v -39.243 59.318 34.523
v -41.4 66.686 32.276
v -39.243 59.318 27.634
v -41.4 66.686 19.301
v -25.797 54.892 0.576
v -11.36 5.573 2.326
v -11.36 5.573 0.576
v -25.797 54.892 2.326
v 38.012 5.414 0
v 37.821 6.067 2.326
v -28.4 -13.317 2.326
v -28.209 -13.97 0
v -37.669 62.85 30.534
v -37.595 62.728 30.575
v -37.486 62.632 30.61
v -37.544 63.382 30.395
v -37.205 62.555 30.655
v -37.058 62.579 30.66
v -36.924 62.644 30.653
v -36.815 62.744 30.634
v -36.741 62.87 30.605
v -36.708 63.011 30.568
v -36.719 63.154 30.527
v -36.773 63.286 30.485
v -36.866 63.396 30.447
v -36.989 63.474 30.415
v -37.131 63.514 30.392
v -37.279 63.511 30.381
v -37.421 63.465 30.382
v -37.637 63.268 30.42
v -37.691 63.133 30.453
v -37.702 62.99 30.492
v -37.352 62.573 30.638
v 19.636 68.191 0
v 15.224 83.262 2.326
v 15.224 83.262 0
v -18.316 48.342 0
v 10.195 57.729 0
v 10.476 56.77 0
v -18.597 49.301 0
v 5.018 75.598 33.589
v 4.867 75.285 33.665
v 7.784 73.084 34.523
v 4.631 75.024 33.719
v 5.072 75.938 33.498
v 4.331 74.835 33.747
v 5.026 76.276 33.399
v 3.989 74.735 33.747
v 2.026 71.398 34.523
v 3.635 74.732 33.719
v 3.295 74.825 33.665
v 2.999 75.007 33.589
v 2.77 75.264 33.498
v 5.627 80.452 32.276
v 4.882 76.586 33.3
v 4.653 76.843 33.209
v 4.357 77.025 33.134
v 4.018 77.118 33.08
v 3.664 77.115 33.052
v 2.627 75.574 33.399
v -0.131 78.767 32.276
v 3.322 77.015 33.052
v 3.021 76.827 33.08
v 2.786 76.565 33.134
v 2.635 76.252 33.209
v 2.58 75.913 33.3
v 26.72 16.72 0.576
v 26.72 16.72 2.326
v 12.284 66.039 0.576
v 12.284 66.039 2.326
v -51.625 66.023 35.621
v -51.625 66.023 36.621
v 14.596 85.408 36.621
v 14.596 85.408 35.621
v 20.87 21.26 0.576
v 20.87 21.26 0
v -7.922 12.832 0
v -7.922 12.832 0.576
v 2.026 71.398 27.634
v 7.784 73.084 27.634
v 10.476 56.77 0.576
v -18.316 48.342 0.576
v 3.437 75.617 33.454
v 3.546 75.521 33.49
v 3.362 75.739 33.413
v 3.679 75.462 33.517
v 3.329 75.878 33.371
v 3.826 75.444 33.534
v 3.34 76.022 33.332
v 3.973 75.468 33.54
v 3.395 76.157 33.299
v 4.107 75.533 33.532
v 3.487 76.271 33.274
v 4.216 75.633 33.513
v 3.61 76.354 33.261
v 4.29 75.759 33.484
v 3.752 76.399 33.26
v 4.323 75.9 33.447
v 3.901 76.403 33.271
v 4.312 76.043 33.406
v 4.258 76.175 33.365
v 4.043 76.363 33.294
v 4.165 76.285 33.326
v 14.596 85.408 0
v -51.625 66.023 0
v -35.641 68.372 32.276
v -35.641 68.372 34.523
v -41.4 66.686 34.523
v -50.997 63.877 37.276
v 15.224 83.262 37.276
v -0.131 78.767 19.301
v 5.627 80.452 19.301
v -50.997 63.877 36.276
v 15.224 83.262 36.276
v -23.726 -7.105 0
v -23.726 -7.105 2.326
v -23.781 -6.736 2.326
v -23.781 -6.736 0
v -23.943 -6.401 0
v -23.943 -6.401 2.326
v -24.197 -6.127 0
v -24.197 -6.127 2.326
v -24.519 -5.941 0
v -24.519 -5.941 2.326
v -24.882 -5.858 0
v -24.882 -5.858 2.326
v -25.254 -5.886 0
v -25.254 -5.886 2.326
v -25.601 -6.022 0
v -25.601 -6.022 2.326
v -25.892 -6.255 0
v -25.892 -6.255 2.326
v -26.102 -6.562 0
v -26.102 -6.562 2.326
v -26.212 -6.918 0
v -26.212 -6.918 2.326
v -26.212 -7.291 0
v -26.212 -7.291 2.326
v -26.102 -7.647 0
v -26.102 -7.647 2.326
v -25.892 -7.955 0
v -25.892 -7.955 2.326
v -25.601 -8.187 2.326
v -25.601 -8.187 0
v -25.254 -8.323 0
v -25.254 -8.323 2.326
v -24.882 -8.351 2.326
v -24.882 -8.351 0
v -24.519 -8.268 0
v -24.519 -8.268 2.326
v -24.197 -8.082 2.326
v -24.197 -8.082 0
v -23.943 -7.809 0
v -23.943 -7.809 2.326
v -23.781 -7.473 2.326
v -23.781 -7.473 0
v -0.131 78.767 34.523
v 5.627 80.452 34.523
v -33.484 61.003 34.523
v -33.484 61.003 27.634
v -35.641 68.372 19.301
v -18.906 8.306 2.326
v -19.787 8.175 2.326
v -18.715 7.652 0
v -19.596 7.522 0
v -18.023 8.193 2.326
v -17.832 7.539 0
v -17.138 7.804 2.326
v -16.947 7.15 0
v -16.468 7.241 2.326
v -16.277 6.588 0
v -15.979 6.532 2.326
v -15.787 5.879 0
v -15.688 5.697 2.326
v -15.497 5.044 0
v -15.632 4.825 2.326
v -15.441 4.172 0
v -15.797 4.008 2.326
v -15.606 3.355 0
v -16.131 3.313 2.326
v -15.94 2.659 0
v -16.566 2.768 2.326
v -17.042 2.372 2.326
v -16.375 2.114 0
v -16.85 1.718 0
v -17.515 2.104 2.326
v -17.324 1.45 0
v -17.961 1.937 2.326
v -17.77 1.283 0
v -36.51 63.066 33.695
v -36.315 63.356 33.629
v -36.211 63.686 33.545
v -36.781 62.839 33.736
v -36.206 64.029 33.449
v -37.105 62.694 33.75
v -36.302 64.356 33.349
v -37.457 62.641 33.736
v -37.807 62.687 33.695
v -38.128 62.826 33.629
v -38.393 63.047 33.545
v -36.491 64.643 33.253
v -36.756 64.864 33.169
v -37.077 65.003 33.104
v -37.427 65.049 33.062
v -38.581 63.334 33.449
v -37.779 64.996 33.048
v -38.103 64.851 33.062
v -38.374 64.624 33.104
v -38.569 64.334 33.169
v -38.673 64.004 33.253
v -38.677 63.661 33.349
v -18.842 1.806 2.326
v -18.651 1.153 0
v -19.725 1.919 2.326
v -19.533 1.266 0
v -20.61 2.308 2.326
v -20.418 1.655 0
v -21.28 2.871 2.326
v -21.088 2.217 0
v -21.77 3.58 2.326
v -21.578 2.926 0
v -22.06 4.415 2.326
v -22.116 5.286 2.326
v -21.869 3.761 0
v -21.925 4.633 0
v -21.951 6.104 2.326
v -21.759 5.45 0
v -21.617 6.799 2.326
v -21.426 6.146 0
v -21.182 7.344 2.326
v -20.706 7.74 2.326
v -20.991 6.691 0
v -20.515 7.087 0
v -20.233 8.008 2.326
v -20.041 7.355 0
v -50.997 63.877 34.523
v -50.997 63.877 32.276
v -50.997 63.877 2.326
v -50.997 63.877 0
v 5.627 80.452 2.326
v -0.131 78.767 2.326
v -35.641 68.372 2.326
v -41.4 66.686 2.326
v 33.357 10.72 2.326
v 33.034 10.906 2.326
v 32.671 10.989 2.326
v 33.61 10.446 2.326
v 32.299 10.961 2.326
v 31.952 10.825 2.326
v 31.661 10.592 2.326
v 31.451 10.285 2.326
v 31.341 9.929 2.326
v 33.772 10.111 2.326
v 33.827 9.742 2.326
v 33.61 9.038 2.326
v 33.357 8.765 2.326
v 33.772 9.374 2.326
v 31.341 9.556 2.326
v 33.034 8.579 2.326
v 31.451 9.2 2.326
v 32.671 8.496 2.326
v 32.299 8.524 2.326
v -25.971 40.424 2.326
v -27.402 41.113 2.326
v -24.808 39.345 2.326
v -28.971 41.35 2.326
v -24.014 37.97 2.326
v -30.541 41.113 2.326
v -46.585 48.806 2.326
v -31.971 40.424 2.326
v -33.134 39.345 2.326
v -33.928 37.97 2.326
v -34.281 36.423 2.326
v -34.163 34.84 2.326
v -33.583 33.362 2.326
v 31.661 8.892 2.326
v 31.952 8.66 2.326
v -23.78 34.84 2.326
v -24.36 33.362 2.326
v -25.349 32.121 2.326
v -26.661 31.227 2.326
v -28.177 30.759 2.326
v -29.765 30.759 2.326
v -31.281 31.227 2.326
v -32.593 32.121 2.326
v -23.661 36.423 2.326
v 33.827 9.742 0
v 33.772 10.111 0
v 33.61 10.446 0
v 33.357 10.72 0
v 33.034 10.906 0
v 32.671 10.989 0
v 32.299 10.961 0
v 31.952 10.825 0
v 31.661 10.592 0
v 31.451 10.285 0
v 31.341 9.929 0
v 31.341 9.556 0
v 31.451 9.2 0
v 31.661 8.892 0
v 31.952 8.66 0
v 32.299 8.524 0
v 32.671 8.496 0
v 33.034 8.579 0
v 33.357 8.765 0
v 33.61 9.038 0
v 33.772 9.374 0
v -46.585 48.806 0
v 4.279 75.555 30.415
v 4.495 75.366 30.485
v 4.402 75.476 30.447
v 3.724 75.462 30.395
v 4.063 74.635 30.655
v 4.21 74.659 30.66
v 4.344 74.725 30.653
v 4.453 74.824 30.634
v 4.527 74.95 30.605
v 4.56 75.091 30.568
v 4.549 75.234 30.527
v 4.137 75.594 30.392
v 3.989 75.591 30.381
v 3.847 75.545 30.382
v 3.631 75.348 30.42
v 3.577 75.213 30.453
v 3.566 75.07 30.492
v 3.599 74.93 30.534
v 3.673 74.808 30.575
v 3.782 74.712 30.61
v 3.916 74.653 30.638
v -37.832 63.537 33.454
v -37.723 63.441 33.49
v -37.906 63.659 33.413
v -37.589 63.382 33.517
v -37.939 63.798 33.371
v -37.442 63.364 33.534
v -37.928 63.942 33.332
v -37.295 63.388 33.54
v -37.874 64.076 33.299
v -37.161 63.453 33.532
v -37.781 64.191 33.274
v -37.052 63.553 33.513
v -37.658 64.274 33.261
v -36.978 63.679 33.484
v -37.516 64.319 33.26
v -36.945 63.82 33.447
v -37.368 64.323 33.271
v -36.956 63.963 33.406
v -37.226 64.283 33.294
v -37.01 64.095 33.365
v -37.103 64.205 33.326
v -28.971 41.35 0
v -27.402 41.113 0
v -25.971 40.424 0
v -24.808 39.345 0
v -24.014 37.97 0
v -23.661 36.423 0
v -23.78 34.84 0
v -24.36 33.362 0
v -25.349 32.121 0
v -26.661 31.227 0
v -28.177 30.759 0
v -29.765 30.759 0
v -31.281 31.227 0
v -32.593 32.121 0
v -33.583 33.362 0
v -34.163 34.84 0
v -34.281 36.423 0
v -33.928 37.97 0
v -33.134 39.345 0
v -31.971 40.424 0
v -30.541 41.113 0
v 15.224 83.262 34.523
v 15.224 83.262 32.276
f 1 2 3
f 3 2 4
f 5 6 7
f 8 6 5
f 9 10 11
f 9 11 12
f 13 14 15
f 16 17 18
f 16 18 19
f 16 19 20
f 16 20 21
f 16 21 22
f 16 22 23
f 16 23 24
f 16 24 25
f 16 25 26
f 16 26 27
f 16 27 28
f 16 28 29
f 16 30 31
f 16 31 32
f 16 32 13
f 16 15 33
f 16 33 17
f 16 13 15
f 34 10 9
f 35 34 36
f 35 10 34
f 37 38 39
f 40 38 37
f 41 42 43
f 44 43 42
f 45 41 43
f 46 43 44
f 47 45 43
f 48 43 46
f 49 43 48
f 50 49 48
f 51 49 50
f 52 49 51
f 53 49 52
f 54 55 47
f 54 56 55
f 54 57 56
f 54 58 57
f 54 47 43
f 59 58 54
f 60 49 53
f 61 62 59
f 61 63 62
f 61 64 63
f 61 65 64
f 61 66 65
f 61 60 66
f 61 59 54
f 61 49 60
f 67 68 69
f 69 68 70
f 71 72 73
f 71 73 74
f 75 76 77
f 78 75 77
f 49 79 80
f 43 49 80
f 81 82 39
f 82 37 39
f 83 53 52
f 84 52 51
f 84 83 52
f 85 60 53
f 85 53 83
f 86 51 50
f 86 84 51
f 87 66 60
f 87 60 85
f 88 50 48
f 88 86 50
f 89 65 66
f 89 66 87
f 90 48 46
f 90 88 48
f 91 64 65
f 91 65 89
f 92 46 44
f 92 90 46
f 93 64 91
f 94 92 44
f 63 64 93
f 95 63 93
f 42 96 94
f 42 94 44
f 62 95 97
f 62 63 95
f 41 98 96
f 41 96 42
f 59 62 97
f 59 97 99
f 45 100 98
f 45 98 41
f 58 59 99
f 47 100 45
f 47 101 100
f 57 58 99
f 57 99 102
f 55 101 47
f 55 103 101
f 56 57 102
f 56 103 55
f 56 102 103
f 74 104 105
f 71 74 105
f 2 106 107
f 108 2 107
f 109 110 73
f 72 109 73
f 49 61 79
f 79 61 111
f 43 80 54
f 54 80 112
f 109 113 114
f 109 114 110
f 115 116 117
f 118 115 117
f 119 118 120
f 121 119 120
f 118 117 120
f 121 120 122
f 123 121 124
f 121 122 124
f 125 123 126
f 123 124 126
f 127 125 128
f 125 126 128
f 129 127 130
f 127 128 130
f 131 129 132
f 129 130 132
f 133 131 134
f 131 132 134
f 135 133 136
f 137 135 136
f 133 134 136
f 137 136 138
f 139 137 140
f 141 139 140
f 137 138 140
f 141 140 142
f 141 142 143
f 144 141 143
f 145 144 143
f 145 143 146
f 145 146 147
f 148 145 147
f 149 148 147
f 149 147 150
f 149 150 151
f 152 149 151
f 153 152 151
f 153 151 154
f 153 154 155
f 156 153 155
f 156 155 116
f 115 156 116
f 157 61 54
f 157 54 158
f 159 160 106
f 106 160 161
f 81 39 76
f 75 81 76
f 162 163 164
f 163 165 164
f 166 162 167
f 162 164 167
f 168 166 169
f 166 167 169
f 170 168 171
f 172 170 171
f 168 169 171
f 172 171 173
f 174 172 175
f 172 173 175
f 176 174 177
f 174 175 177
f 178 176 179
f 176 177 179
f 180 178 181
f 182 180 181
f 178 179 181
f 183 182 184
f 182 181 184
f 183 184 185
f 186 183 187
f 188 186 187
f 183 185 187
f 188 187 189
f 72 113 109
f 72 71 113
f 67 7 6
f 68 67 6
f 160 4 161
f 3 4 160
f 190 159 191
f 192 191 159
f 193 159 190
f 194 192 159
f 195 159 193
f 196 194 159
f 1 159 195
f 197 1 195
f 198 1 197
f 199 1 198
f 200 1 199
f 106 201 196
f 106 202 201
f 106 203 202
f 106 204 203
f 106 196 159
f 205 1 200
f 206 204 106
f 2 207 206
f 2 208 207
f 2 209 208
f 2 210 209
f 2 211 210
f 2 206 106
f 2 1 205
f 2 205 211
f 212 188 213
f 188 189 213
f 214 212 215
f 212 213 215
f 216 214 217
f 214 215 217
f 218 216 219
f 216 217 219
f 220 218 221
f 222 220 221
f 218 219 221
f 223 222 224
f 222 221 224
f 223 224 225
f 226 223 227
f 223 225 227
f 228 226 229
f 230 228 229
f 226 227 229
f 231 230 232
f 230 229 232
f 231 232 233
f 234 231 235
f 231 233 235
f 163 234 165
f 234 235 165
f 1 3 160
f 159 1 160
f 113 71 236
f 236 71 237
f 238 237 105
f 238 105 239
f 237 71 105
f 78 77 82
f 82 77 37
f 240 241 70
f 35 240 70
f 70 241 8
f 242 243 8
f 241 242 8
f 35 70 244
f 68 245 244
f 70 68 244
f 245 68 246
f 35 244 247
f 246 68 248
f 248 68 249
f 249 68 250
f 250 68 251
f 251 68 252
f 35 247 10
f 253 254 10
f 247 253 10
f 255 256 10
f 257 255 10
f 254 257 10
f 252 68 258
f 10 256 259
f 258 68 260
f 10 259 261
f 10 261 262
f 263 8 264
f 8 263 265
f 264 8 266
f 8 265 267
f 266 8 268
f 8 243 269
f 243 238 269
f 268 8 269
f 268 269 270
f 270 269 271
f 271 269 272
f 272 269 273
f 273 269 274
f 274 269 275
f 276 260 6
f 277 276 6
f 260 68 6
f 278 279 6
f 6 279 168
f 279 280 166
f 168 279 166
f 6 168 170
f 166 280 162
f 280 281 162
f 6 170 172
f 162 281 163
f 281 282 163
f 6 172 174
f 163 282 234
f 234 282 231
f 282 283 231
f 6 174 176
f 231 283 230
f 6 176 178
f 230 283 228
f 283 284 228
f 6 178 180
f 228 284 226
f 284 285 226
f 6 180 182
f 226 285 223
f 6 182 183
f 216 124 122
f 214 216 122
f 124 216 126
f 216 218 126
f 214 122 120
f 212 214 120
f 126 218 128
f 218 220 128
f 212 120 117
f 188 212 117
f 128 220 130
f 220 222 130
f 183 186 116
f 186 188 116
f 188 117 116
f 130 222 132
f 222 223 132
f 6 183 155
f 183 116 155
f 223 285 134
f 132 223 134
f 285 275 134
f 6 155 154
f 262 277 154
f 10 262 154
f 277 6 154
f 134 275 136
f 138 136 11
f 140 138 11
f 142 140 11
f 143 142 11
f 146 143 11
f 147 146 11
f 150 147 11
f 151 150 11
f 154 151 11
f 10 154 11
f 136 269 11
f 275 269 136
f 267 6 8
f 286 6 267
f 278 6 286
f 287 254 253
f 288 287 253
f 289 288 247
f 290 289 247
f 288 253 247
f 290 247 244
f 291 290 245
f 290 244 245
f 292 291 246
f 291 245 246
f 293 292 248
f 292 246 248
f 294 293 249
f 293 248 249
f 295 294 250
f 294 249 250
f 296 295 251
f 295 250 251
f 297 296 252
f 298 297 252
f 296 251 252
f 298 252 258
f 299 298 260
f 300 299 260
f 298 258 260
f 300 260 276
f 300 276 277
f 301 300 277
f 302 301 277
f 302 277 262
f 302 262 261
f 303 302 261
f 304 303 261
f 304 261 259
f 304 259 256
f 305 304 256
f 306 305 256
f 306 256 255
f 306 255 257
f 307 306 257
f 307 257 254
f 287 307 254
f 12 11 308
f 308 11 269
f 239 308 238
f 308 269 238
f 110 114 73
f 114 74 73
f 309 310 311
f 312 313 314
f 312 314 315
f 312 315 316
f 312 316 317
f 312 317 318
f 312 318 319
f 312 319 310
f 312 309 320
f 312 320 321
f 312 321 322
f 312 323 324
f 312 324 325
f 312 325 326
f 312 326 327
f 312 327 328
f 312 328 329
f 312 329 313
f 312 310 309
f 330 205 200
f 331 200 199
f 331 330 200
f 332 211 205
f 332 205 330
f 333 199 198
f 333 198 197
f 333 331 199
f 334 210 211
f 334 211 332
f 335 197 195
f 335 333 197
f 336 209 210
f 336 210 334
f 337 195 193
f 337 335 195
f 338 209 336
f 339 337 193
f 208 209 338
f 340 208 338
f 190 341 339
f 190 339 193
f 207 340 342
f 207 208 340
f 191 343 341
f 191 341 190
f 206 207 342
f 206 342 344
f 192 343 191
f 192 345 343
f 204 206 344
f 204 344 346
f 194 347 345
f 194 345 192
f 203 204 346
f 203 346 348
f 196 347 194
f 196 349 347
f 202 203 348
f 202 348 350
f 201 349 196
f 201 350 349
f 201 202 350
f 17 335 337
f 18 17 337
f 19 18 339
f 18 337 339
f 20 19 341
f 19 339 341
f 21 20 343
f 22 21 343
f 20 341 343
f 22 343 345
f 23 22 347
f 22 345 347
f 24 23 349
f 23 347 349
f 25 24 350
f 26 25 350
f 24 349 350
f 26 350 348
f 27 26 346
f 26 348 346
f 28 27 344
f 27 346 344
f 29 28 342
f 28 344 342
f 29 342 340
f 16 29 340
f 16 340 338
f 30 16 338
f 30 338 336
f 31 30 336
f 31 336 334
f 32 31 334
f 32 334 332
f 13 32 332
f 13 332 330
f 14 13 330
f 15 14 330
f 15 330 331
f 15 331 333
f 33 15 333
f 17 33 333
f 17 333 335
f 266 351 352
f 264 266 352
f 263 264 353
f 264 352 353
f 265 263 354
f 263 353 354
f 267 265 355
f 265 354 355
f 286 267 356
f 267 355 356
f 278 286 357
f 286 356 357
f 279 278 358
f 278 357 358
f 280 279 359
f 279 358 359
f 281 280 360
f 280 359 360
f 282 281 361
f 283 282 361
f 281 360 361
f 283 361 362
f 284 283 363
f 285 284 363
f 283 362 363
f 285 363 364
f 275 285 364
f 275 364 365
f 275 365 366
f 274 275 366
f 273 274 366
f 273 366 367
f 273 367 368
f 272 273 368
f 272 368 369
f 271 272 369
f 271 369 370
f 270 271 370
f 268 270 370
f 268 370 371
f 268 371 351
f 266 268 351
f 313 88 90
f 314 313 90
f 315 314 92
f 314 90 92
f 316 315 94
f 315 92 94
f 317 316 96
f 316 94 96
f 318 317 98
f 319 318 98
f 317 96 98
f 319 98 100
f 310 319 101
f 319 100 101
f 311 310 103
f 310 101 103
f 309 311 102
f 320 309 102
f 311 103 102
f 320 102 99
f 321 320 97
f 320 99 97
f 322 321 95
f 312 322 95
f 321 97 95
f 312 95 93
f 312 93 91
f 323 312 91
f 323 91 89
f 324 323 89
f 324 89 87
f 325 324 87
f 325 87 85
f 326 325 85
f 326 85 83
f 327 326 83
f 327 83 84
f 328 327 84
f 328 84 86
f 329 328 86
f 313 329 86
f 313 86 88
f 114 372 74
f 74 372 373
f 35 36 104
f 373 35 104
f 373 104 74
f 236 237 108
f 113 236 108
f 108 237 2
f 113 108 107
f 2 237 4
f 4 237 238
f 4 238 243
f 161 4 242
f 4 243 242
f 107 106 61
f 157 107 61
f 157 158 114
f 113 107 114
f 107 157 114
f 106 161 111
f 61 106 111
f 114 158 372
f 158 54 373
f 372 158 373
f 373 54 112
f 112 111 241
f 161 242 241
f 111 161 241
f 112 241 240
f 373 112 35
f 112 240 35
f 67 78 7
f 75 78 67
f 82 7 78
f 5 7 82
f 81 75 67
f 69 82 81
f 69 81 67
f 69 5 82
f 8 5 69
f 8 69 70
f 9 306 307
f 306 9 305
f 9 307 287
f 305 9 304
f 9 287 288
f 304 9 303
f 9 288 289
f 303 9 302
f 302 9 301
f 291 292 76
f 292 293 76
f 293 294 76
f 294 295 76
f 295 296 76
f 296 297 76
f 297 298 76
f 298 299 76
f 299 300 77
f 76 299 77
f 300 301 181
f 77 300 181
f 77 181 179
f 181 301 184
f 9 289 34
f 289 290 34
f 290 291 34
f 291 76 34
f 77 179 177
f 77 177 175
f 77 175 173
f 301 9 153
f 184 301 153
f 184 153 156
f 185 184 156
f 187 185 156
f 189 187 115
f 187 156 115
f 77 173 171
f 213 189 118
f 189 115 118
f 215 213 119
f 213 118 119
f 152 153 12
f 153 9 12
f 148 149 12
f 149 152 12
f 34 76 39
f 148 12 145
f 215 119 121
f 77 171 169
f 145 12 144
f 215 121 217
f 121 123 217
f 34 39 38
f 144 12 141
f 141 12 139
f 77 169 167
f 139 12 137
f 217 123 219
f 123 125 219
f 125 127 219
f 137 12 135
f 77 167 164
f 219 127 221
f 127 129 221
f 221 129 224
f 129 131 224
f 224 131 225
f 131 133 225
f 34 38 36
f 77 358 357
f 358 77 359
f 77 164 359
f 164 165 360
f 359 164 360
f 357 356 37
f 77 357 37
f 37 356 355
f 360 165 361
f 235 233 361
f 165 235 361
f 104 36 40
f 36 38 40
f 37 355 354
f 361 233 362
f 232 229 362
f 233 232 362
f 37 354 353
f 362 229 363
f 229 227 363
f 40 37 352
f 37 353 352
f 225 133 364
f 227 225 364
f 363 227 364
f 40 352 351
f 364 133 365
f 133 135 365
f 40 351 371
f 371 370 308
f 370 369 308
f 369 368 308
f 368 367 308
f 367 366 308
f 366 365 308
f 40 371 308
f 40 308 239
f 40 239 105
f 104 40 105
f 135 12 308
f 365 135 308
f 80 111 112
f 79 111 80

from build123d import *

# Parameters (mm, degrees)
SALIENTE_EXTRUIR1_START       = 2.11e-07
SALIENTE_EXTRUIR1_DEPTH       = 36.2755111
SALIENTE_EXTRUIR1_START_2     = 19.300740439
SALIENTE_EXTRUIR1_2_DEPTH     = 15.222231072
SALIENTE_EXTRUIR1_3_DEPTH     = 0.575969357
SALIENTE_EXTRUIR1_START_3     = 0.575969568
SALIENTE_EXTRUIR1_4_DEPTH     = 1.75
SALIENTE_EXTRUIR1_START_4     = -30.997891642
SALIENTE_EXTRUIR1_5_DEPTH     = 69
SALIENTE_EXTRUIR1_6_OUTLINE_W = 15.703224266
SALIENTE_EXTRUIR1_6_OUTLINE_H = 2.325969357
SALIENTE_EXTRUIR1_6_DEPTH     = 69
SALIENTE_EXTRUIR1_7_DEPTH     = 21.66081402
SALIENTE_EXTRUIR1_START_5     = 30.341294328
SALIENTE_EXTRUIR1_8_DEPTH     = 7.66081403
SALIENTE_EXTRUIR2_DEPTH       = 1
CROQUIS3_R                    = 1.25
CORTAR_EXTRUIR1_DEPTH         = 10
CROQUIS4_R                    = 5.324975084
CORTAR_EXTRUIR2_DEPTH         = 10
SALIENTE_EXTRUIR3_DEPTH       = 69
CORTAR_EXTRUIR3_DEPTH         = 69
SALIENTE_EXTRUIR4_REACH       = 101.278
CROQUIS7_R                    = 1.25
CROQUIS7_R_2                  = 0.5


with BuildPart() as part:
    # Saliente-Extruir1: read off the stored shape, not the designer's step
    # Saliente-Extruir1 outline → Saliente-Extruir1 (new body)
    with BuildSketch(Plane.XY.offset(SALIENTE_EXTRUIR1_START)):
        Polygon((-51.625046866, 66.023279607), (-50.996835351, 63.877170392), (15.224363662, 83.261514624), (14.596152147, 85.407623839), align=None)
    extrude(amount=SALIENTE_EXTRUIR1_DEPTH)

    # Saliente-Extruir1 2 outline → Saliente-Extruir1 2 (add)
    with BuildSketch(Plane.XY.offset(SALIENTE_EXTRUIR1_START_2)):
        Polygon((-35.641195, 68.372090794), (-41.399560131, 66.686495643), (-39.242610722, 59.317880312), (-33.484245591, 61.003475463), align=None)
        Polygon((5.627088443, 80.452189373), (-0.131276689, 78.766594222), (2.02567272, 71.397978892), (7.784037852, 73.083574042), align=None)
    extrude(amount=SALIENTE_EXTRUIR1_2_DEPTH)

    # Saliente-Extruir1 3 outline → Saliente-Extruir1 3 (add)
    # profile 1 of 3: a face of its own
    with BuildSketch(Plane.XY.offset(SALIENTE_EXTRUIR1_START)):
        Polygon((-35.641195, 68.372090794), (-41.399560131, 66.686495643), (-39.242610722, 59.317880312), (-33.484245591, 61.003475463), align=None)
    # profile 2 of 3: a face of its own
    with BuildSketch(Plane.XY.offset(SALIENTE_EXTRUIR1_START)):
        Polygon((5.627088443, 80.452189373), (-0.131276689, 78.766594222), (2.02567272, 71.397978892), (7.784037852, 73.083574042), align=None)
    # profile 3 of 3: a face of its own
    with BuildSketch(Plane.XY.offset(SALIENTE_EXTRUIR1_START)):
        Polygon((-25.796809543, 54.891581059), (-11.360360521, 5.573484337), (26.720065065, 16.720429561), (12.283616043, 66.038526283), align=None)
        Polygon((-18.597227896, 49.301446301), (10.194597762, 57.729422054), (20.870033716, 21.259776221), (-7.921791942, 12.831800468), align=None, mode=Mode.SUBTRACT)
    extrude(amount=SALIENTE_EXTRUIR1_3_DEPTH)

    # Saliente-Extruir1 4 outline → Saliente-Extruir1 4 (add)
    with BuildSketch(Plane.XY.offset(SALIENTE_EXTRUIR1_START_3)):
        Polygon((-35.641195, 68.372090794), (-41.399560131, 66.686495643), (-39.242610722, 59.317880312), (-33.484245591, 61.003475463), align=None)
        Polygon((5.627088443, 80.452189373), (-0.131276689, 78.766594222), (2.02567272, 71.397978892), (7.784037852, 73.083574042), align=None)
    extrude(amount=SALIENTE_EXTRUIR1_4_DEPTH)

    # Saliente-Extruir1 5 outline → Saliente-Extruir1 5 (cut)
    with BuildSketch(Plane(origin=(0, 0, 0), x_dir=(-0.2809325251095079, 0.9597275219225484, 0), z_dir=(0.9597275219225485, 0.2809325251095079, 0)).offset(SALIENTE_EXTRUIR1_START_4)):
        Polygon((67.953527999, 19.300740439), (75.631348175, 19.300740439), (67.953528, 27.634470761), align=None)
        Polygon((67.953528, 34.522971511), (75.631348175, 32.275511311), (75.631348175, 34.522971511), align=None)
        Polygon((75.631348175, 36.275511311), (77.867513301, 35.620938527), (77.867513301, 36.275511311), align=None)
    extrude(amount=SALIENTE_EXTRUIR1_5_DEPTH, mode=Mode.SUBTRACT)

    # Saliente-Extruir1 6 outline → Saliente-Extruir1 6 (add)
    with BuildSketch(Plane(origin=(0, 0, 0), x_dir=(-0.2809325251095079, 0.9597275219225484, 0), z_dir=(0.9597275219225485, 0.2809325251095079, 0)).offset(SALIENTE_EXTRUIR1_START_4)):
        with Locations((67.779736042, 1.16298489)):
            Rectangle(SALIENTE_EXTRUIR1_6_OUTLINE_W, SALIENTE_EXTRUIR1_6_OUTLINE_H)
        Polygon((8.540521078, 2.11e-07), (8.540521079, 2.325969568), (-5.302071851, 2.325969568), (-5.982932231, 2.11e-07), align=None)
    extrude(amount=SALIENTE_EXTRUIR1_6_DEPTH)

    # Saliente-Extruir1 7 outline → Saliente-Extruir1 7 (add)
    with BuildSketch(Plane(origin=(0, 0, 0), x_dir=(-0.2809325251095079, 0.9597275219225484, 0), z_dir=(0.9597275219225485, 0.2809325251095079, 0)).offset(SALIENTE_EXTRUIR1_START_4)):
        Polygon((59.928123909, 2.11e-07), (59.928123909, 2.325969568), (8.540521079, 2.325969568), (8.540521078, 2.11e-07), align=None)
    extrude(amount=SALIENTE_EXTRUIR1_7_DEPTH)

    # Saliente-Extruir1 8 outline → Saliente-Extruir1 8 (add)
    with BuildSketch(Plane(origin=(0, 0, 0), x_dir=(-0.2809325251095079, 0.9597275219225484, 0), z_dir=(0.9597275219225485, 0.2809325251095079, 0)).offset(SALIENTE_EXTRUIR1_START_5)):
        Polygon((59.928123909, 2.11e-07), (59.928123909, 2.325969568), (8.540521079, 2.325969568), (8.540521078, 2.11e-07), align=None)
    extrude(amount=SALIENTE_EXTRUIR1_8_DEPTH)

    # Saliente-Extruir1 9: loft between two sections, ruled curve by curve
    saliente_extruir1_9_from = [
        Edge.make_bspline([(-17.960997328, 1.936811392, 2.325969568), (-24.199226221, 0.110749979, 2.325969568), (-26.025287634, 6.348978871, 2.325969568), (-19.787058741, 8.175040285, 2.325969568)], [0, 0, 0, 0, 1, 1, 1, 1], 3, [1, 0.333333333, 0.333333333, 1]),
        Edge.make_bspline([(-19.787058741, 8.175040285, 2.325969568), (-13.548829849, 10.001101698, 2.325969568), (-11.722768436, 3.762872805, 2.325969568), (-17.960997328, 1.936811392, 2.325969568)], [0, 0, 0, 0, 1, 1, 1, 1], 3, [1, 0.333333333, 0.333333333, 1]),
    ]
    saliente_extruir1_9_to = [
        Edge.make_bspline([(-17.769721503, 1.283370947, 2.11e-07), (-24.007950395, -0.542690466, 2.11e-07), (-25.834011808, 5.695538426, 2.11e-07), (-19.595782916, 7.52159984, 2.11e-07)], [0, 0, 0, 0, 1, 1, 1, 1], 3, [1, 0.333333333, 0.333333333, 1]),
        Edge.make_bspline([(-19.595782916, 7.52159984, 2.11e-07), (-13.357554023, 9.347661253, 2.11e-07), (-11.53149261, 3.10943236, 2.11e-07), (-17.769721503, 1.283370947, 2.11e-07)], [0, 0, 0, 0, 1, 1, 1, 1], 3, [1, 0.333333333, 0.333333333, 1]),
    ]
    saliente_extruir1_9 = Solid(Shell([*[Face.make_surface_from_curves(saliente_extruir1_9_from[k], saliente_extruir1_9_to[k]) for k in range(2)], Face(Wire(saliente_extruir1_9_from)), Face(Wire(saliente_extruir1_9_to))]))
    add(saliente_extruir1_9, mode=Mode.SUBTRACT)

    # Saliente-Extruir1 10: loft between two sections, ruled curve by curve
    saliente_extruir1_10_from = [
        Edge.make_three_point_arc((5.262809235, 75.46739376, 30.520058845), (3.726126487, 76.267574249, 30.168893189), (2.86349043, 74.765062447, 30.520058845)),
        Edge.make_three_point_arc((2.86349043, 74.765062447, 30.520058845), (4.400173178, 73.964881958, 30.871224502), (5.262809235, 75.46739376, 30.520058845)),
    ]
    saliente_extruir1_10_to = [
        Edge.make_three_point_arc((5.026039984, 76.276249789, 33.399241411), (3.489357236, 77.076430278, 33.048075755), (2.626721179, 75.573918476, 33.399241411)),
        Edge.make_three_point_arc((2.626721179, 75.573918476, 33.399241411), (4.163403927, 74.773737987, 33.750407067), (5.026039984, 76.276249789, 33.399241411)),
    ]
    saliente_extruir1_10 = Solid(Shell([*[Face.make_surface_from_curves(saliente_extruir1_10_from[k], saliente_extruir1_10_to[k]) for k in range(2)], Face(Wire(saliente_extruir1_10_from)), Face(Wire(saliente_extruir1_10_to))]))
    add(saliente_extruir1_10, mode=Mode.SUBTRACT)

    # Saliente-Extruir1 11: loft between two sections, ruled curve by curve
    saliente_extruir1_11_from = [
        Edge.make_three_point_arc((-36.868110265, 61.884783379, 30.871224502), (-36.005474208, 63.387295181, 30.520058845), (-37.542156955, 64.18747567, 30.168893189)),
        Edge.make_three_point_arc((-37.542156955, 64.18747567, 30.168893189), (-38.404793012, 62.684963868, 30.520058845), (-36.868110265, 61.884783379, 30.871224502)),
    ]
    saliente_extruir1_11_to = [
        Edge.make_three_point_arc((-37.104879516, 62.693639407, 33.750407067), (-36.242243459, 64.196151209, 33.399241411), (-37.778926206, 64.996331698, 33.048075755)),
        Edge.make_three_point_arc((-37.778926206, 64.996331698, 33.048075755), (-38.641562263, 63.493819896, 33.399241411), (-37.104879516, 62.693639407, 33.750407067)),
    ]
    saliente_extruir1_11 = Solid(Shell([*[Face.make_surface_from_curves(saliente_extruir1_11_from[k], saliente_extruir1_11_to[k]) for k in range(2)], Face(Wire(saliente_extruir1_11_from)), Face(Wire(saliente_extruir1_11_to))]))
    add(saliente_extruir1_11, mode=Mode.SUBTRACT)

    # Saliente-Extruir1 12: loft between two sections, ruled curve by curve
    saliente_extruir1_12_from = [
        Edge.make_three_point_arc((-30.979047738, 39.986658971, 2.325969568), (-25.396077527, 36.932081486, 2.325969568), (-28.450655012, 31.349111274, 2.325969568)),
        Edge.make_three_point_arc((-28.450655012, 31.349111274, 2.325969568), (-34.033625224, 34.40368876, 2.325969568), (-30.979047738, 39.986658971, 2.325969568)),
    ]
    saliente_extruir1_12_to = [
        Edge.make_three_point_arc((-30.979047738, 39.986658971, 2.11e-07), (-25.396077527, 36.932081486, 2.11e-07), (-28.450655012, 31.349111274, 2.11e-07)),
        Edge.make_three_point_arc((-28.450655012, 31.349111274, 2.11e-07), (-34.033625224, 34.40368876, 2.11e-07), (-30.979047738, 39.986658971, 2.11e-07)),
    ]
    saliente_extruir1_12 = Solid(Shell([*[Face.make_surface_from_curves(saliente_extruir1_12_from[k], saliente_extruir1_12_to[k]) for k in range(2)], Face(Wire(saliente_extruir1_12_from)), Face(Wire(saliente_extruir1_12_to))]))
    add(saliente_extruir1_12, mode=Mode.SUBTRACT)

    # Croquis2 → Saliente-Extruir2 (add)
    with BuildSketch(Plane(origin=(-14.760341257, 50.424584095, 0), x_dir=(-0.9597275219225485, -0.28093252510950767, 0), z_dir=(0.28093252510950767, -0.9597275219225485, 0))):
        Polygon((3.997891642, -0.575969568), (-26.002108358, -0.575969568), (-26.002108358, -2.11e-07), (3.997891642, 0), align=None)
    extrude(amount=SALIENTE_EXTRUIR2_DEPTH)

    # Croquis3 → Cortar-Extruir1 (cut)
    with BuildSketch(Plane.XY.offset(2.325969568)):
        with Locations((32.57715474, 9.742255252)):
            Circle(CROQUIS3_R)
        with Locations((-24.975865422, -7.104729869)):
            Circle(CROQUIS3_R)
    extrude(amount=-CORTAR_EXTRUIR1_DEPTH, mode=Mode.SUBTRACT)

    # Croquis4 → Cortar-Extruir2 (cut)
    with BuildSketch(Plane(origin=(0, 0, 0), x_dir=(-1, 0, 0), z_dir=(0, 0, -1))):
        with Locations(Location((28.971074723, 36.024788725, 0), (0, 0, 90))):
            Circle(CROQUIS4_R)
    extrude(amount=-CORTAR_EXTRUIR2_DEPTH, mode=Mode.SUBTRACT)

    # Croquis5 → Saliente-Extruir3 (add)
    with BuildSketch(Plane(origin=(36.471669282, 10.67602826, 0), x_dir=(0, 0, -1), z_dir=(0.9597275219225486, 0.28093252510950756, 0))):
        Polygon((-36.275511311, 75.631348175), (-37.275511311, 75.631348175), (-36.620938527, 77.867513301), (-35.620938527, 77.867513301), align=None)
    extrude(amount=-SALIENTE_EXTRUIR3_DEPTH)

    # Croquis6 → Cortar-Extruir3 (cut)
    with BuildSketch(Plane(origin=(36.471669282, 10.67602826, 0), x_dir=(0, 0, -1), z_dir=(0.9597275219225486, 0.28093252510950756, 0))):
        Polygon((-2.325969568, -5.302071851), (-2.325969568, -4.802071851), (-2.11e-07, -5.482932231), (-2.11e-07, -5.982932231), align=None)
    extrude(amount=-CORTAR_EXTRUIR3_DEPTH, mode=Mode.SUBTRACT)

    # Croquis7 → Saliente-Extruir4 (add, up to next)
    with BuildSketch(Plane(origin=(-4.121600365, 14.080296693, 50.119852402), x_dir=(0.9968807084425405, 0.021345720862208265, 0.07598166447223464), z_dir=(-0.07892308366440427, 0.2696186761507921, 0.9597275219225484)), mode=Mode.PRIVATE) as saliente_extruir4_sk1:
        with Locations((-33.424563455, 52.432282093)):
            Circle(CROQUIS7_R)
        with Locations(Location((-33.424563455, 52.432282093, 0), (0, 0, 270.000000004))):
            Circle(CROQUIS7_R_2, mode=Mode.SUBTRACT)
    saliente_extruir4_tool1 = extrude(saliente_extruir4_sk1.sketch, amount=-SALIENTE_EXTRUIR4_REACH, mode=Mode.PRIVATE) - part.part
    # Croquis7 → Saliente-Extruir4 (add, up to next)
    with BuildSketch(Plane(origin=(-4.121600365, 14.080296693, 50.119852402), x_dir=(0.9968807084425405, 0.021345720862208265, 0.07598166447223464), z_dir=(-0.07892308366440427, 0.2696186761507921, 0.9597275219225484)), mode=Mode.PRIVATE) as saliente_extruir4_sk2:
        with Locations((7.972850592, 64.062162154)):
            Circle(CROQUIS7_R)
        with Locations(Location((7.972850592, 64.062162154, 0), (0, 0, 270.000000007))):
            Circle(CROQUIS7_R_2, mode=Mode.SUBTRACT)
    saliente_extruir4_tool2 = extrude(saliente_extruir4_sk2.sketch, amount=-SALIENTE_EXTRUIR4_REACH, mode=Mode.PRIVATE) - part.part
    add(saliente_extruir4_tool1.solids().sort_by_distance((-38.652759, 63.819058, 33.306951))[0])
    add(saliente_extruir4_tool2.solids().sort_by_distance((2.615525, 75.899157, 33.306951))[0])


solid = part.part
